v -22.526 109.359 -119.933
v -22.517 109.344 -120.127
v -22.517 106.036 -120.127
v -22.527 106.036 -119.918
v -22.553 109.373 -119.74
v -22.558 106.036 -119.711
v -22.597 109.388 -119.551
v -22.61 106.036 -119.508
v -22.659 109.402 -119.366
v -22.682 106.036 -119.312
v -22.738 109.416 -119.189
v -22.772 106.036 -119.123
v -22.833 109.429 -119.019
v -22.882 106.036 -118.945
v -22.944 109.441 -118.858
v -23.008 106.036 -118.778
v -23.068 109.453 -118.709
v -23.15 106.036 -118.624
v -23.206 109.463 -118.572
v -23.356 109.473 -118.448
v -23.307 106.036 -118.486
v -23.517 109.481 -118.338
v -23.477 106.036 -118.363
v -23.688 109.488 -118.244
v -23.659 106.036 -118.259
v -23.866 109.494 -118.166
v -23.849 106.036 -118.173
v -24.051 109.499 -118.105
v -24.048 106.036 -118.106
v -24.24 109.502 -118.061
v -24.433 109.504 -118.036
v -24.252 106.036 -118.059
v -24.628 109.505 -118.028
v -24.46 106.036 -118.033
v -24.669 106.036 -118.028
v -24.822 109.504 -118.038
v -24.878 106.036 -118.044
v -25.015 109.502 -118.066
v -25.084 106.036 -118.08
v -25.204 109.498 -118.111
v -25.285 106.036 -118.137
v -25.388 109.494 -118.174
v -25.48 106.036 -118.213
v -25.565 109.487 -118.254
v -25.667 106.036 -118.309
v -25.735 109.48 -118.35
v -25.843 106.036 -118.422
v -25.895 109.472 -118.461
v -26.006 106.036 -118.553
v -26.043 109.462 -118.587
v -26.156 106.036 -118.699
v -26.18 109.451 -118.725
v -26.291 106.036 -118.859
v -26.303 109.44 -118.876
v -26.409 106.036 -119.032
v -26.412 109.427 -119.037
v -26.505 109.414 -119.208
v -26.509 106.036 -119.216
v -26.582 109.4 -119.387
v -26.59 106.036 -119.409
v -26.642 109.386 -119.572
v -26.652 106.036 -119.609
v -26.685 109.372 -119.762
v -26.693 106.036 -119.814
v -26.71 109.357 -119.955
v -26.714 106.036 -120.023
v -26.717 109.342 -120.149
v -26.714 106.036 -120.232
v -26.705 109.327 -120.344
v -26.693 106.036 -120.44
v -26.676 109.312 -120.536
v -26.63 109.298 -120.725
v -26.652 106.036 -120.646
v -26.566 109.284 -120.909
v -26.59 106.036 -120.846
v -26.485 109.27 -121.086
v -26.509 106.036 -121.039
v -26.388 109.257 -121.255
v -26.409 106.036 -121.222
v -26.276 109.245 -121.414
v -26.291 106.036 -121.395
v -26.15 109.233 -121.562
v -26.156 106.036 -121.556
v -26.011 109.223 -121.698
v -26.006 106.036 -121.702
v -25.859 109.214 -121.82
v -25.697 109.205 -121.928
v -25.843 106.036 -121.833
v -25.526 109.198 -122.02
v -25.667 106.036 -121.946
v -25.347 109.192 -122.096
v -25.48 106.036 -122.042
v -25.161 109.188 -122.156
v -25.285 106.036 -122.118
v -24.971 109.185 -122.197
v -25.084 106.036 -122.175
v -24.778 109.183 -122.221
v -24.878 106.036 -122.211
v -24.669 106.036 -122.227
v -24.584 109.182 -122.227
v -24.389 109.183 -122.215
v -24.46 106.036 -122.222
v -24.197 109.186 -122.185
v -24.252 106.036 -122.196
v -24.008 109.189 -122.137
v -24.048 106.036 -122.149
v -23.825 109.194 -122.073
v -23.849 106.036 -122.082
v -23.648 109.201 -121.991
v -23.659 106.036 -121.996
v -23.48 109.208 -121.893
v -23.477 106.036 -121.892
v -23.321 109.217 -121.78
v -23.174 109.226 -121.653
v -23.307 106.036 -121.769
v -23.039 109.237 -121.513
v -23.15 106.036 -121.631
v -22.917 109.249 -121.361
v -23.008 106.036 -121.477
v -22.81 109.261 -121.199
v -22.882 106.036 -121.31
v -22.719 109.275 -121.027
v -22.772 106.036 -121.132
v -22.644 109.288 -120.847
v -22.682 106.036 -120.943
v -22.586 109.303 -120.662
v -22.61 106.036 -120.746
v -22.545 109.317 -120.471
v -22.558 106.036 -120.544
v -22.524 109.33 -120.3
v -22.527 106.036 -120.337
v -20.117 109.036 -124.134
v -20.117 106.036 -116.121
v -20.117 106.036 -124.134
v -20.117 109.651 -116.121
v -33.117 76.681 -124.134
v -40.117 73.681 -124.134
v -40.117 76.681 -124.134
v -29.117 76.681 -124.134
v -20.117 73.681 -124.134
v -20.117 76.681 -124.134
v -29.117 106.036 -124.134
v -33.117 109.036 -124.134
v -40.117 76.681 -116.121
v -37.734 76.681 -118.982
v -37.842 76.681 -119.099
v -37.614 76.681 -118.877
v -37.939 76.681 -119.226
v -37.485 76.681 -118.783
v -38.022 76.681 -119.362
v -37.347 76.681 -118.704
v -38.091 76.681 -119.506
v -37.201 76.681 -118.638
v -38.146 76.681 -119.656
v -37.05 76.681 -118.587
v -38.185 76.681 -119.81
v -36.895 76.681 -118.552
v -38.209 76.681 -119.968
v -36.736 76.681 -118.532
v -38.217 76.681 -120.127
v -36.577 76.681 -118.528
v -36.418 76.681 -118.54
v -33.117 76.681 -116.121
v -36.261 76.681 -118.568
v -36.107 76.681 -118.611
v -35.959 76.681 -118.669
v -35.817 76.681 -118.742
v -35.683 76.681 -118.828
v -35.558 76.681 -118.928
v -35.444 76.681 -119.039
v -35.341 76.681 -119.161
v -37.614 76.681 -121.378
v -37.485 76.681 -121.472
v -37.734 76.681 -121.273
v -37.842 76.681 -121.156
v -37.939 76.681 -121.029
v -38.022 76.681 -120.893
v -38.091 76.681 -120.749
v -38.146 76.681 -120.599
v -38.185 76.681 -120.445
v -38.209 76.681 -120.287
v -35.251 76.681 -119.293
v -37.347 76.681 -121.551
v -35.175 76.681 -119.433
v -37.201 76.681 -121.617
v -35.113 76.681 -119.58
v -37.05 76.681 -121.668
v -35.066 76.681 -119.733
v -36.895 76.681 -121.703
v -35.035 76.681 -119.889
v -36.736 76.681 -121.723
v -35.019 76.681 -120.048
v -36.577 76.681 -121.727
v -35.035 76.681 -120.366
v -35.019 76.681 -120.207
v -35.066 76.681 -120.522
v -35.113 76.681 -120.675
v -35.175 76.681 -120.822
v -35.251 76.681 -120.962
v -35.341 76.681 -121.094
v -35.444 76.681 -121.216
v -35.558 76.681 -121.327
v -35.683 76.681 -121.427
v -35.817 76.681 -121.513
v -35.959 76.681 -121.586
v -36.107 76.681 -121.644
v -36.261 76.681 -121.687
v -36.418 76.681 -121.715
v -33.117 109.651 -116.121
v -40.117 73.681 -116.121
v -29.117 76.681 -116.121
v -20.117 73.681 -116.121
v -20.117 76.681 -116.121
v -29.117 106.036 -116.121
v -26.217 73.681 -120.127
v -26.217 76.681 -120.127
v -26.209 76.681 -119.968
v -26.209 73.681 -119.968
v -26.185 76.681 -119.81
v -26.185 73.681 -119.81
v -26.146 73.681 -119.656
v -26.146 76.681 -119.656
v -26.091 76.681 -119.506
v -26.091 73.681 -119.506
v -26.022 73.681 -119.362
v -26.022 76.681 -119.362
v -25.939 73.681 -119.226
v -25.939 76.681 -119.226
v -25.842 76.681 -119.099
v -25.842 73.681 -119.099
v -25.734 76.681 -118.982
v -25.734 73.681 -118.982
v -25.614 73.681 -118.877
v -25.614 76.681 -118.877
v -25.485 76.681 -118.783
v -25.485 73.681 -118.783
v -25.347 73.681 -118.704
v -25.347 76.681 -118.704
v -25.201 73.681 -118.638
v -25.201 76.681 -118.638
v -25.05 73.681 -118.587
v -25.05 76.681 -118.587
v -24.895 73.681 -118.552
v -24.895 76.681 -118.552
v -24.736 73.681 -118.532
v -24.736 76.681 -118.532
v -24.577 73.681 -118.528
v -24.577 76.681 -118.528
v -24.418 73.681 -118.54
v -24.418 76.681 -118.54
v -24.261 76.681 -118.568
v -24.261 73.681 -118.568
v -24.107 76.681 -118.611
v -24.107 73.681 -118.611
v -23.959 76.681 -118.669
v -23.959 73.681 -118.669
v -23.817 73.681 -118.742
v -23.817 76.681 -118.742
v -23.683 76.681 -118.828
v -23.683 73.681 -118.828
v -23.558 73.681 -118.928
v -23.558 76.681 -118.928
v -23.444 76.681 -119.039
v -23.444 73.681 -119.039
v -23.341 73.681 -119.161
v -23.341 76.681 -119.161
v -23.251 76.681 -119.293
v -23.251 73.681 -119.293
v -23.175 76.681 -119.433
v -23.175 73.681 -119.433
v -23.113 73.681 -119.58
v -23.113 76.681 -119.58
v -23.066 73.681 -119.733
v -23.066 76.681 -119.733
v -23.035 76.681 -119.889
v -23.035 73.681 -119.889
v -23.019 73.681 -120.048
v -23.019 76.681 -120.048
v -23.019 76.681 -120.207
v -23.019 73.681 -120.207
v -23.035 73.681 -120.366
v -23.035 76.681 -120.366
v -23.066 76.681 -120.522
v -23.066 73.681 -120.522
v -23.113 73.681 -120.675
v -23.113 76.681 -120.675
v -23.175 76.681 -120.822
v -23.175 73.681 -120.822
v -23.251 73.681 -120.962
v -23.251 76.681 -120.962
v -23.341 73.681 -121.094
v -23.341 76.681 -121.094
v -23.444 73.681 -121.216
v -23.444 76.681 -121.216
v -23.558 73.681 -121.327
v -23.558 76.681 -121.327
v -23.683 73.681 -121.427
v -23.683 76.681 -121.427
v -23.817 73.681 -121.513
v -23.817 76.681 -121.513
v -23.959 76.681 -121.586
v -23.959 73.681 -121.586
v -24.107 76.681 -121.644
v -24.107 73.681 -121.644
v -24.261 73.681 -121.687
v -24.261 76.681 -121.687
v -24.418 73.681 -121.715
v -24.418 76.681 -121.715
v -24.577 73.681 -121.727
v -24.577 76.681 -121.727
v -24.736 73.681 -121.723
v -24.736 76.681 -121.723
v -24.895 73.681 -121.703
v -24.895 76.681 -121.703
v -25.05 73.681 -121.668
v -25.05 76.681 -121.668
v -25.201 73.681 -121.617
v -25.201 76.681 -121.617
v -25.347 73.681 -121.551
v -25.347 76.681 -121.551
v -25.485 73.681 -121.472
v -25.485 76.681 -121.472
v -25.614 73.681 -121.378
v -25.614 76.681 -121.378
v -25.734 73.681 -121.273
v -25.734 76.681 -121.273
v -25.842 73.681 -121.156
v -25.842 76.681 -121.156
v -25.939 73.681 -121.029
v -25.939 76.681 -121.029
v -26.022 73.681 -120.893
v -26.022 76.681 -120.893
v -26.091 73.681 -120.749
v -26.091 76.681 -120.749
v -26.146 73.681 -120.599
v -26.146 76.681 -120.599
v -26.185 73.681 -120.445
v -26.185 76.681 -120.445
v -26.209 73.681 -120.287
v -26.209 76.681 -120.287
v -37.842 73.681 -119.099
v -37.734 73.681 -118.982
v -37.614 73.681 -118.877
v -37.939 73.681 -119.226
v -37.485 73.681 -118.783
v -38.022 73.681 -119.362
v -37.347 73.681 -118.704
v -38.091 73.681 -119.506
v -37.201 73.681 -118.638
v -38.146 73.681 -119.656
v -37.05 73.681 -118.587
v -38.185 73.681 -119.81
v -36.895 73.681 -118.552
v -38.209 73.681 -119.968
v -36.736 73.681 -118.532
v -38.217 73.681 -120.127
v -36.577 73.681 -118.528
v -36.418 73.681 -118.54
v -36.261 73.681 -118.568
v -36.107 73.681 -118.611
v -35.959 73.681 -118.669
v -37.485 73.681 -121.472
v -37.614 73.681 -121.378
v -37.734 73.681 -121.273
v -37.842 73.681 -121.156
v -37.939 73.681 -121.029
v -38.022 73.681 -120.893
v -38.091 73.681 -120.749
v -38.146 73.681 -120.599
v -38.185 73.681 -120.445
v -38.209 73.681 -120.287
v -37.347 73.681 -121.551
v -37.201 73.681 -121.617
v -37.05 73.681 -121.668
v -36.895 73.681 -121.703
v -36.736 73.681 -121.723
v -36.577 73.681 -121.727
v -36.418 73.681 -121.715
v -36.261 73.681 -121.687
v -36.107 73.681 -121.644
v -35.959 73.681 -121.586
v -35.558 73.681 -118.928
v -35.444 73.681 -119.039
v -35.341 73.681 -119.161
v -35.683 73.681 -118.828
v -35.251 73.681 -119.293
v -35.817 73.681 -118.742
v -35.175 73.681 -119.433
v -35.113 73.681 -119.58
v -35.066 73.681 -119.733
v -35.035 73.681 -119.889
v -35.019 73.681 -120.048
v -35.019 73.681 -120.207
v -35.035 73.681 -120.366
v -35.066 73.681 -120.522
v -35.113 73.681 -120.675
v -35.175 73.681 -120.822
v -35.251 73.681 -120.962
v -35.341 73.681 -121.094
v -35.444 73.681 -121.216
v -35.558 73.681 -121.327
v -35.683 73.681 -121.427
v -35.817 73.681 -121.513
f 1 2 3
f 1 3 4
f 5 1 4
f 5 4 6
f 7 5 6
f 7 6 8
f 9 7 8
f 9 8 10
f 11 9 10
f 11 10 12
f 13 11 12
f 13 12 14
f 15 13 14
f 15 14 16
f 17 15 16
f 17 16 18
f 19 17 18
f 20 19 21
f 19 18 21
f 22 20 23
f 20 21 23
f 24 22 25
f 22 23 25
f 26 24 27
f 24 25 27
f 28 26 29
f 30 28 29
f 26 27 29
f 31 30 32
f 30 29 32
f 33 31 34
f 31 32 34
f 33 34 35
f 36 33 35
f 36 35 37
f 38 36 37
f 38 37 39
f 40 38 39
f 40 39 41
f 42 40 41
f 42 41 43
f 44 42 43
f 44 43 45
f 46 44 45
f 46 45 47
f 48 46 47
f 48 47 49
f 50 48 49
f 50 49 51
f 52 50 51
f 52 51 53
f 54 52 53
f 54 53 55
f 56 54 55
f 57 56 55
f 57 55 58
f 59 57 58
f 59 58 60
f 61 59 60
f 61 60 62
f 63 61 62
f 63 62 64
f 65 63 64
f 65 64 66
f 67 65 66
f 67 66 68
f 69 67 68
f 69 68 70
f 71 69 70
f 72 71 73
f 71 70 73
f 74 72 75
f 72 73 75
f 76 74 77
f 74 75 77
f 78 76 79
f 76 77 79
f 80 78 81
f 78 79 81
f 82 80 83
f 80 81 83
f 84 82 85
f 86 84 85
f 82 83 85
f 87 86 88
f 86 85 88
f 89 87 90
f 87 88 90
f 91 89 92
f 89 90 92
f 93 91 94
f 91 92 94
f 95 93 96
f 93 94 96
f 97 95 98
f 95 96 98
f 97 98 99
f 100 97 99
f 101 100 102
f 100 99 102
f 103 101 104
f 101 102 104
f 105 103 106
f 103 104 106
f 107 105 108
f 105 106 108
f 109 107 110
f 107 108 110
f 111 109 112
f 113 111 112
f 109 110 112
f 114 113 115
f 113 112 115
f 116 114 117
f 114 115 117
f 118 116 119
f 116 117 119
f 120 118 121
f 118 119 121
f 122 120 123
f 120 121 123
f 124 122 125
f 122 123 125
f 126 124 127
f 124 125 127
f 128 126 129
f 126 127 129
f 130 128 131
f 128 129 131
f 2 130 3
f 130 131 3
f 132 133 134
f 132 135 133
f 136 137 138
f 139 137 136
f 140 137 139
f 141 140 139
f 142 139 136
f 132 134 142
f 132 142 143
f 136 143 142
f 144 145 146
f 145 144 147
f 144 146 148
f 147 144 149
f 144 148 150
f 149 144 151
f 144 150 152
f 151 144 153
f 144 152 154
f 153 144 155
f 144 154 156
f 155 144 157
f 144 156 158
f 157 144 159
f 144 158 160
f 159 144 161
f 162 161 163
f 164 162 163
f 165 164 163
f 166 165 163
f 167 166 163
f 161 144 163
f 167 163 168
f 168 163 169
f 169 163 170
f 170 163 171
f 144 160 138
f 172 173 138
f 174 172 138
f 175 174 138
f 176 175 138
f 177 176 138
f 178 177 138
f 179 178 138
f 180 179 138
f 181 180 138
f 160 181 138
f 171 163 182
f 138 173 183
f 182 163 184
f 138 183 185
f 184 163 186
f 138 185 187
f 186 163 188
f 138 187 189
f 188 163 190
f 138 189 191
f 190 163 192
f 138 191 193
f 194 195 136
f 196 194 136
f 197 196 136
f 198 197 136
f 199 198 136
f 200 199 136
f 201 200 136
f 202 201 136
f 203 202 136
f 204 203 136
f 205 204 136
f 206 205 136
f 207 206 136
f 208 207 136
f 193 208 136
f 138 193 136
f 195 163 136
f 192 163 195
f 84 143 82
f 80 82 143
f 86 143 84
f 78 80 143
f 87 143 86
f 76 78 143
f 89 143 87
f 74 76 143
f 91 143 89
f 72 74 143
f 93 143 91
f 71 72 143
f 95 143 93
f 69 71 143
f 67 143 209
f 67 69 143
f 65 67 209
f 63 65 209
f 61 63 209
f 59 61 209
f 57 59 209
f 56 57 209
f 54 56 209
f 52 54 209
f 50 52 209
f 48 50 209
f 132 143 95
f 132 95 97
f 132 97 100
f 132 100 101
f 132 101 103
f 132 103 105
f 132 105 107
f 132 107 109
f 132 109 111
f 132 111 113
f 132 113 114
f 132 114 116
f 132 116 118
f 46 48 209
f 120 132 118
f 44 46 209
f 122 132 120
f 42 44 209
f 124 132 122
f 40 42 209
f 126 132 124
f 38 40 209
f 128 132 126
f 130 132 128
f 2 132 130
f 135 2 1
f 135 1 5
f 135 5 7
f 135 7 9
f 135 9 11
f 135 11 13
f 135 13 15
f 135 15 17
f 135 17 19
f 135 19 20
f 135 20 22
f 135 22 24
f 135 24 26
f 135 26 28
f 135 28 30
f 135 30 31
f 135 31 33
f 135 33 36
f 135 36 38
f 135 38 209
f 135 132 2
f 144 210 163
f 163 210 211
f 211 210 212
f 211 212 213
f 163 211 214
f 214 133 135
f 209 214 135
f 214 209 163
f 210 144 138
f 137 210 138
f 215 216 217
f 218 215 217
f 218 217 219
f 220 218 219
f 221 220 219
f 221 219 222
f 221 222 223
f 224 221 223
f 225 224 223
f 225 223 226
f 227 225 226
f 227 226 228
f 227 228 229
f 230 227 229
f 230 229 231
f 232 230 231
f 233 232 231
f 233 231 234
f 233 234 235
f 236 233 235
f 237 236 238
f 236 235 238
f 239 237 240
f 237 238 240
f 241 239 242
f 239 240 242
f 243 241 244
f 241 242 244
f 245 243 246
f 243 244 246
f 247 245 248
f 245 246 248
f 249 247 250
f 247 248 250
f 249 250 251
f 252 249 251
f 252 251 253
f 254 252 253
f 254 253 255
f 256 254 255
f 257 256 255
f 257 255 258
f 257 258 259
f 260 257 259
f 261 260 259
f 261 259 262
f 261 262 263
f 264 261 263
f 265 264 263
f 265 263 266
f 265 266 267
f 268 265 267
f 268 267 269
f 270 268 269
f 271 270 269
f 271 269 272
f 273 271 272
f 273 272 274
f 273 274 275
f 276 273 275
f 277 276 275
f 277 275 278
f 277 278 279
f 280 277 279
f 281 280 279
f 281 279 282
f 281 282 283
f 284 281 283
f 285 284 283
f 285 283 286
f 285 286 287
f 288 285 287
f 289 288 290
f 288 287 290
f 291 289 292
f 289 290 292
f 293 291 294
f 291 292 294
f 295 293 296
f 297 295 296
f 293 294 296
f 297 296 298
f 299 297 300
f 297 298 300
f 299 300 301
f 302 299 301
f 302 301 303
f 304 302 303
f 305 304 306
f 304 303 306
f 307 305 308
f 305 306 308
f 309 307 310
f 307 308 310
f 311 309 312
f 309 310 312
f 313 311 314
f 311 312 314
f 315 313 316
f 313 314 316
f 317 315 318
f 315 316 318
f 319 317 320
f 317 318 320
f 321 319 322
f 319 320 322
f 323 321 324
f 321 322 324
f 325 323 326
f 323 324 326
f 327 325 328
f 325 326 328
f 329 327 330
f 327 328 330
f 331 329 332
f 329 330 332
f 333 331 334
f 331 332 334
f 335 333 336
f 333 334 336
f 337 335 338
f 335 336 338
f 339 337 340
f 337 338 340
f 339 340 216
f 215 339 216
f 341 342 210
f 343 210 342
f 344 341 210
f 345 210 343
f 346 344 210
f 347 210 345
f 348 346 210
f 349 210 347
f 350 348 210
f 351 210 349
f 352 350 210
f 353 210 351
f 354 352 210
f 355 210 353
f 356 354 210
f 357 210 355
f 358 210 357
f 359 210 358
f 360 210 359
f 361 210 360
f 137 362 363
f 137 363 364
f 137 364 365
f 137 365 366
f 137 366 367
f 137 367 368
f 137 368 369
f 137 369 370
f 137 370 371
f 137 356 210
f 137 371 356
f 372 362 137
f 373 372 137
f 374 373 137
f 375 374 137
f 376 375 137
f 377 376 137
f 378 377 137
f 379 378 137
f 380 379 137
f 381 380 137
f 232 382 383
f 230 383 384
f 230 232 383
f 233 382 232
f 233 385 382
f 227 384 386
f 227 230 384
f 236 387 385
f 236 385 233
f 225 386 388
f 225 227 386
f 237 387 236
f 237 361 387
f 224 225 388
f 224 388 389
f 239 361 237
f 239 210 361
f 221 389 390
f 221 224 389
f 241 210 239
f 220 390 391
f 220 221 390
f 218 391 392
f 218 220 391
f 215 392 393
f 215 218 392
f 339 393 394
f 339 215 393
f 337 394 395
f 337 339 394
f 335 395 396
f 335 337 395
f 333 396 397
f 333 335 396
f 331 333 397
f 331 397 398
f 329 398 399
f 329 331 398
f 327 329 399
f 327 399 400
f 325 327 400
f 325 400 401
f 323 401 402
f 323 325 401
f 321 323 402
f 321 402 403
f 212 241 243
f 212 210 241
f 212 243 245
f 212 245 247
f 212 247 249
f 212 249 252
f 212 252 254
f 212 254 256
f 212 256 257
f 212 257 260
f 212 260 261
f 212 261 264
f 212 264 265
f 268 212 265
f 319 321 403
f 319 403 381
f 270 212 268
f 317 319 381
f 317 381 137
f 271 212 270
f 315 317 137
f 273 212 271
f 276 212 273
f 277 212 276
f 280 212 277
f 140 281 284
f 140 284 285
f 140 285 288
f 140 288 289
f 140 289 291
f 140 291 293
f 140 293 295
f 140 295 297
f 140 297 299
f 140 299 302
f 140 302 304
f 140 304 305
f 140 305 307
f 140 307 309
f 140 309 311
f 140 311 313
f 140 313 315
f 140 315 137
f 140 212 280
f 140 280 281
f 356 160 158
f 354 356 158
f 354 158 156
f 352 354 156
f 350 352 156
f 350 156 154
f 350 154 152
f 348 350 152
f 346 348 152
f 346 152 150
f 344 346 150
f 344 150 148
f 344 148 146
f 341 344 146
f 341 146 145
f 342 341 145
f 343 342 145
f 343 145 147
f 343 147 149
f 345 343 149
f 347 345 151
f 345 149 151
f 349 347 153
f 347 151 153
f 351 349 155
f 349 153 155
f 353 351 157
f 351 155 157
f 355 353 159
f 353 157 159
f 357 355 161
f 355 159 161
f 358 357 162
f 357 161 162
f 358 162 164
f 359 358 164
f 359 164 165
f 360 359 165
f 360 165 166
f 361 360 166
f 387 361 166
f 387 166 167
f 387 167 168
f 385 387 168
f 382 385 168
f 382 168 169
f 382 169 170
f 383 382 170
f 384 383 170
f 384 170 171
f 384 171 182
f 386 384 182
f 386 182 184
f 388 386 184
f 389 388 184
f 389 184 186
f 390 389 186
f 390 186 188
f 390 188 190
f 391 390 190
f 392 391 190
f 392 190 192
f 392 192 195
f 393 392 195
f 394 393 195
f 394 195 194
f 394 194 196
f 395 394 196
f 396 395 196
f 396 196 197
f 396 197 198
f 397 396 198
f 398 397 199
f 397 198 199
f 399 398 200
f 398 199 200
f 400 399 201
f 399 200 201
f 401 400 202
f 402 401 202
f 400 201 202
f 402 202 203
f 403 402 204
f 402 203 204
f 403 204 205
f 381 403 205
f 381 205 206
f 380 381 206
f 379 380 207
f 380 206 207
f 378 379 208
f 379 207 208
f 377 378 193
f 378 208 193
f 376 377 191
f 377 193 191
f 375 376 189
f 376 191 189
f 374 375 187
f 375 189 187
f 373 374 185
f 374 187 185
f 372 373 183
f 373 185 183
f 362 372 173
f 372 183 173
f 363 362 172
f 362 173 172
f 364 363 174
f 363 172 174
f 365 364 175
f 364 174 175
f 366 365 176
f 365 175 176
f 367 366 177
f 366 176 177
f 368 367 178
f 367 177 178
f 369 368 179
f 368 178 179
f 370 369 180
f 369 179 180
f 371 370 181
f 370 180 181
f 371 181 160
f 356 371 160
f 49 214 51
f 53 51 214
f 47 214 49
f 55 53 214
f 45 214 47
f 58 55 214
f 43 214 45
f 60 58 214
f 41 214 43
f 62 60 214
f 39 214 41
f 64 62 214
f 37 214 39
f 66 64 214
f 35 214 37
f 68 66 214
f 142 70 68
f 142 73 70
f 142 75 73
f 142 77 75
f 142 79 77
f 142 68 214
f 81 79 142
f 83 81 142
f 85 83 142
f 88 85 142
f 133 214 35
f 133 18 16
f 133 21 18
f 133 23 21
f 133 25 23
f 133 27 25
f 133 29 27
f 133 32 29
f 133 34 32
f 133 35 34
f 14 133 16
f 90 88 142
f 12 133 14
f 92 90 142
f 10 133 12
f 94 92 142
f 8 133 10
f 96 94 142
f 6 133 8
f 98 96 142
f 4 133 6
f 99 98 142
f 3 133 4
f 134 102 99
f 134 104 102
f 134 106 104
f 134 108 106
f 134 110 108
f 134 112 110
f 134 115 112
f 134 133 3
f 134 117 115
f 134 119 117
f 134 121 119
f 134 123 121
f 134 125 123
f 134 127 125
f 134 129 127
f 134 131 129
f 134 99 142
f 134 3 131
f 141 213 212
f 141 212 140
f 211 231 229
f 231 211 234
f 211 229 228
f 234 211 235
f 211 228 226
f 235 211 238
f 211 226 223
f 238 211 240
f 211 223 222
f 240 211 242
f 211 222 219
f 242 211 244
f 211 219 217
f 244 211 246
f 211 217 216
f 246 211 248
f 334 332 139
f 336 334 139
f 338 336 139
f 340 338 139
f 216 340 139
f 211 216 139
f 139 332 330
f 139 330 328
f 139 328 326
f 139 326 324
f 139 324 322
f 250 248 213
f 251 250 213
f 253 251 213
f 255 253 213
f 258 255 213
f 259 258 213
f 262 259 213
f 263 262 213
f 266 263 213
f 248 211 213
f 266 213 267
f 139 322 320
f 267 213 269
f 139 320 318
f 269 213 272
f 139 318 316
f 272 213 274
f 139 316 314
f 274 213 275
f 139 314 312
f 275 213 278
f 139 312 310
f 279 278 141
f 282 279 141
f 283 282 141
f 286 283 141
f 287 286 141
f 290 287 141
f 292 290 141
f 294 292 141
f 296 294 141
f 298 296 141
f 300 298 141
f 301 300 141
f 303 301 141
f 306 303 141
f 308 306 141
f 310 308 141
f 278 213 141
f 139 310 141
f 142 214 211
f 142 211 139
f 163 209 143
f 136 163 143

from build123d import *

# Parameters (mm, degrees)
SKETCH1_W             = 8.012892266
SKETCH1_H             = 3
BOSS_EXTRUDE1_DEPTH   = 9
BOSS_EXTRUDE1_2_DEPTH = 9
BOSS_EXTRUDE2_START   = -9
BOSS_EXTRUDE2_DEPTH   = 4
BOSS_EXTRUDE3_START   = -13
SKETCH1_4_W           = 8.012892266
SKETCH1_4_H           = 3
BOSS_EXTRUDE3_DEPTH   = 7
CUT_EXTRUDE1_REACH    = 136.557
SKETCH2_R             = 1.6
CUT_EXTRUDE2_REACH    = 136.408
SKETCH3_R             = 2.1


with BuildPart() as part:
    # Sketch1 → Boss-Extrude1 (new body)
    with BuildSketch(Plane(origin=(-20.116663772, 0, 0), x_dir=(0, 0, -1), z_dir=(1, 0, 0))):
        with Locations((120.127472222, 75.181369419)):
            Rectangle(SKETCH1_W, SKETCH1_H)
    extrude(amount=-BOSS_EXTRUDE1_DEPTH)



with BuildPart() as body_2:
    # Sketch1 → Boss-Extrude1 2 (new body)
    with BuildSketch(Plane(origin=(-20.116663772, 0, 0), x_dir=(0, 0, -1), z_dir=(1, 0, 0))):
        Polygon((116.121026089, 106.035971289), (124.133918355, 106.035971289), (124.133918355, 109.035971289), (116.121026089, 109.651271917), align=None)
    extrude(amount=-BOSS_EXTRUDE1_2_DEPTH)


with BuildPart() as part_1:
    add(part.part)

    add(body_2.part)  # Boss-Extrude2 merges body 2
    # Sketch1<3> → Boss-Extrude2 (add)
    with BuildSketch(Plane(origin=(-20.116663772, 0, 0), x_dir=(0, 0, -1), z_dir=(1, 0, 0)).offset(BOSS_EXTRUDE2_START)):
        Polygon((116.121026089, 73.681369419), (124.133918355, 73.681369419), (124.133918355, 109.035971289), (116.121026089, 109.651271917), align=None)
    extrude(amount=-BOSS_EXTRUDE2_DEPTH)

    # Sketch1<4> → Boss-Extrude3 (add)
    with BuildSketch(Plane(origin=(-20.116663772, 0, 0), x_dir=(0, 0, -1), z_dir=(1, 0, 0)).offset(BOSS_EXTRUDE3_START)):
        with Locations((120.127472222, 75.181369419)):
            Rectangle(SKETCH1_4_W, SKETCH1_4_H)
    extrude(amount=-BOSS_EXTRUDE3_DEPTH)

    # Sketch2 → Cut-Extrude1 (cut, up to next)
    with BuildSketch(Plane(origin=(0, 76.681369419, 0), x_dir=(1, 0, 0), z_dir=(0, 1, 0)), mode=Mode.PRIVATE) as cut_extrude1_sk1:
        with Locations(Location((-24.616663772, 120.127472222, 0), (0, 0, 180))):
            Circle(SKETCH2_R)
    cut_extrude1_tool1 = extrude(cut_extrude1_sk1.sketch, amount=-CUT_EXTRUDE1_REACH, mode=Mode.PRIVATE) & part_1.part
    # Sketch2 → Cut-Extrude1 (cut, up to next)
    with BuildSketch(Plane(origin=(0, 76.681369419, 0), x_dir=(1, 0, 0), z_dir=(0, 1, 0)), mode=Mode.PRIVATE) as cut_extrude1_sk2:
        with Locations(Location((-36.616663772, 120.127472222, 0), (0, 0, 180))):
            Circle(SKETCH2_R)
    cut_extrude1_tool2 = extrude(cut_extrude1_sk2.sketch, amount=-CUT_EXTRUDE1_REACH, mode=Mode.PRIVATE) & part_1.part
    add(cut_extrude1_tool1.solids().sort_by_distance((-24.616664, 76.681369, -120.127472))[0], mode=Mode.SUBTRACT)
    add(cut_extrude1_tool2.solids().sort_by_distance((-36.616664, 76.681369, -120.127472))[0], mode=Mode.SUBTRACT)

    # Cut-Extrude2: up to this plane
    cut_extrude2_end = Plane(origin=(-33.116663772, 117.873028528, -9.051332034), z_dir=(1.1764260283030438e-15, -0.9970647123754436, 0.07656343341095784))
    # Sketch3 → Cut-Extrude2 (cut, up to the surface)
    with BuildSketch(Plane.XZ.offset(-106.035971289), mode=Mode.PRIVATE) as cut_extrude2_sk1:
        with Locations((-24.616663772, -120.127472222)):
            Circle(SKETCH3_R)
    cut_extrude2_tool1 = split(extrude(cut_extrude2_sk1.sketch, amount=-CUT_EXTRUDE2_REACH, mode=Mode.PRIVATE), bisect_by=cut_extrude2_end, keep=Keep.BOTH, mode=Mode.PRIVATE)
    add(cut_extrude2_tool1.solids().sort_by_distance((-24.616664, 106.035971, -120.127472))[0], mode=Mode.SUBTRACT)


solid = part_1.part
